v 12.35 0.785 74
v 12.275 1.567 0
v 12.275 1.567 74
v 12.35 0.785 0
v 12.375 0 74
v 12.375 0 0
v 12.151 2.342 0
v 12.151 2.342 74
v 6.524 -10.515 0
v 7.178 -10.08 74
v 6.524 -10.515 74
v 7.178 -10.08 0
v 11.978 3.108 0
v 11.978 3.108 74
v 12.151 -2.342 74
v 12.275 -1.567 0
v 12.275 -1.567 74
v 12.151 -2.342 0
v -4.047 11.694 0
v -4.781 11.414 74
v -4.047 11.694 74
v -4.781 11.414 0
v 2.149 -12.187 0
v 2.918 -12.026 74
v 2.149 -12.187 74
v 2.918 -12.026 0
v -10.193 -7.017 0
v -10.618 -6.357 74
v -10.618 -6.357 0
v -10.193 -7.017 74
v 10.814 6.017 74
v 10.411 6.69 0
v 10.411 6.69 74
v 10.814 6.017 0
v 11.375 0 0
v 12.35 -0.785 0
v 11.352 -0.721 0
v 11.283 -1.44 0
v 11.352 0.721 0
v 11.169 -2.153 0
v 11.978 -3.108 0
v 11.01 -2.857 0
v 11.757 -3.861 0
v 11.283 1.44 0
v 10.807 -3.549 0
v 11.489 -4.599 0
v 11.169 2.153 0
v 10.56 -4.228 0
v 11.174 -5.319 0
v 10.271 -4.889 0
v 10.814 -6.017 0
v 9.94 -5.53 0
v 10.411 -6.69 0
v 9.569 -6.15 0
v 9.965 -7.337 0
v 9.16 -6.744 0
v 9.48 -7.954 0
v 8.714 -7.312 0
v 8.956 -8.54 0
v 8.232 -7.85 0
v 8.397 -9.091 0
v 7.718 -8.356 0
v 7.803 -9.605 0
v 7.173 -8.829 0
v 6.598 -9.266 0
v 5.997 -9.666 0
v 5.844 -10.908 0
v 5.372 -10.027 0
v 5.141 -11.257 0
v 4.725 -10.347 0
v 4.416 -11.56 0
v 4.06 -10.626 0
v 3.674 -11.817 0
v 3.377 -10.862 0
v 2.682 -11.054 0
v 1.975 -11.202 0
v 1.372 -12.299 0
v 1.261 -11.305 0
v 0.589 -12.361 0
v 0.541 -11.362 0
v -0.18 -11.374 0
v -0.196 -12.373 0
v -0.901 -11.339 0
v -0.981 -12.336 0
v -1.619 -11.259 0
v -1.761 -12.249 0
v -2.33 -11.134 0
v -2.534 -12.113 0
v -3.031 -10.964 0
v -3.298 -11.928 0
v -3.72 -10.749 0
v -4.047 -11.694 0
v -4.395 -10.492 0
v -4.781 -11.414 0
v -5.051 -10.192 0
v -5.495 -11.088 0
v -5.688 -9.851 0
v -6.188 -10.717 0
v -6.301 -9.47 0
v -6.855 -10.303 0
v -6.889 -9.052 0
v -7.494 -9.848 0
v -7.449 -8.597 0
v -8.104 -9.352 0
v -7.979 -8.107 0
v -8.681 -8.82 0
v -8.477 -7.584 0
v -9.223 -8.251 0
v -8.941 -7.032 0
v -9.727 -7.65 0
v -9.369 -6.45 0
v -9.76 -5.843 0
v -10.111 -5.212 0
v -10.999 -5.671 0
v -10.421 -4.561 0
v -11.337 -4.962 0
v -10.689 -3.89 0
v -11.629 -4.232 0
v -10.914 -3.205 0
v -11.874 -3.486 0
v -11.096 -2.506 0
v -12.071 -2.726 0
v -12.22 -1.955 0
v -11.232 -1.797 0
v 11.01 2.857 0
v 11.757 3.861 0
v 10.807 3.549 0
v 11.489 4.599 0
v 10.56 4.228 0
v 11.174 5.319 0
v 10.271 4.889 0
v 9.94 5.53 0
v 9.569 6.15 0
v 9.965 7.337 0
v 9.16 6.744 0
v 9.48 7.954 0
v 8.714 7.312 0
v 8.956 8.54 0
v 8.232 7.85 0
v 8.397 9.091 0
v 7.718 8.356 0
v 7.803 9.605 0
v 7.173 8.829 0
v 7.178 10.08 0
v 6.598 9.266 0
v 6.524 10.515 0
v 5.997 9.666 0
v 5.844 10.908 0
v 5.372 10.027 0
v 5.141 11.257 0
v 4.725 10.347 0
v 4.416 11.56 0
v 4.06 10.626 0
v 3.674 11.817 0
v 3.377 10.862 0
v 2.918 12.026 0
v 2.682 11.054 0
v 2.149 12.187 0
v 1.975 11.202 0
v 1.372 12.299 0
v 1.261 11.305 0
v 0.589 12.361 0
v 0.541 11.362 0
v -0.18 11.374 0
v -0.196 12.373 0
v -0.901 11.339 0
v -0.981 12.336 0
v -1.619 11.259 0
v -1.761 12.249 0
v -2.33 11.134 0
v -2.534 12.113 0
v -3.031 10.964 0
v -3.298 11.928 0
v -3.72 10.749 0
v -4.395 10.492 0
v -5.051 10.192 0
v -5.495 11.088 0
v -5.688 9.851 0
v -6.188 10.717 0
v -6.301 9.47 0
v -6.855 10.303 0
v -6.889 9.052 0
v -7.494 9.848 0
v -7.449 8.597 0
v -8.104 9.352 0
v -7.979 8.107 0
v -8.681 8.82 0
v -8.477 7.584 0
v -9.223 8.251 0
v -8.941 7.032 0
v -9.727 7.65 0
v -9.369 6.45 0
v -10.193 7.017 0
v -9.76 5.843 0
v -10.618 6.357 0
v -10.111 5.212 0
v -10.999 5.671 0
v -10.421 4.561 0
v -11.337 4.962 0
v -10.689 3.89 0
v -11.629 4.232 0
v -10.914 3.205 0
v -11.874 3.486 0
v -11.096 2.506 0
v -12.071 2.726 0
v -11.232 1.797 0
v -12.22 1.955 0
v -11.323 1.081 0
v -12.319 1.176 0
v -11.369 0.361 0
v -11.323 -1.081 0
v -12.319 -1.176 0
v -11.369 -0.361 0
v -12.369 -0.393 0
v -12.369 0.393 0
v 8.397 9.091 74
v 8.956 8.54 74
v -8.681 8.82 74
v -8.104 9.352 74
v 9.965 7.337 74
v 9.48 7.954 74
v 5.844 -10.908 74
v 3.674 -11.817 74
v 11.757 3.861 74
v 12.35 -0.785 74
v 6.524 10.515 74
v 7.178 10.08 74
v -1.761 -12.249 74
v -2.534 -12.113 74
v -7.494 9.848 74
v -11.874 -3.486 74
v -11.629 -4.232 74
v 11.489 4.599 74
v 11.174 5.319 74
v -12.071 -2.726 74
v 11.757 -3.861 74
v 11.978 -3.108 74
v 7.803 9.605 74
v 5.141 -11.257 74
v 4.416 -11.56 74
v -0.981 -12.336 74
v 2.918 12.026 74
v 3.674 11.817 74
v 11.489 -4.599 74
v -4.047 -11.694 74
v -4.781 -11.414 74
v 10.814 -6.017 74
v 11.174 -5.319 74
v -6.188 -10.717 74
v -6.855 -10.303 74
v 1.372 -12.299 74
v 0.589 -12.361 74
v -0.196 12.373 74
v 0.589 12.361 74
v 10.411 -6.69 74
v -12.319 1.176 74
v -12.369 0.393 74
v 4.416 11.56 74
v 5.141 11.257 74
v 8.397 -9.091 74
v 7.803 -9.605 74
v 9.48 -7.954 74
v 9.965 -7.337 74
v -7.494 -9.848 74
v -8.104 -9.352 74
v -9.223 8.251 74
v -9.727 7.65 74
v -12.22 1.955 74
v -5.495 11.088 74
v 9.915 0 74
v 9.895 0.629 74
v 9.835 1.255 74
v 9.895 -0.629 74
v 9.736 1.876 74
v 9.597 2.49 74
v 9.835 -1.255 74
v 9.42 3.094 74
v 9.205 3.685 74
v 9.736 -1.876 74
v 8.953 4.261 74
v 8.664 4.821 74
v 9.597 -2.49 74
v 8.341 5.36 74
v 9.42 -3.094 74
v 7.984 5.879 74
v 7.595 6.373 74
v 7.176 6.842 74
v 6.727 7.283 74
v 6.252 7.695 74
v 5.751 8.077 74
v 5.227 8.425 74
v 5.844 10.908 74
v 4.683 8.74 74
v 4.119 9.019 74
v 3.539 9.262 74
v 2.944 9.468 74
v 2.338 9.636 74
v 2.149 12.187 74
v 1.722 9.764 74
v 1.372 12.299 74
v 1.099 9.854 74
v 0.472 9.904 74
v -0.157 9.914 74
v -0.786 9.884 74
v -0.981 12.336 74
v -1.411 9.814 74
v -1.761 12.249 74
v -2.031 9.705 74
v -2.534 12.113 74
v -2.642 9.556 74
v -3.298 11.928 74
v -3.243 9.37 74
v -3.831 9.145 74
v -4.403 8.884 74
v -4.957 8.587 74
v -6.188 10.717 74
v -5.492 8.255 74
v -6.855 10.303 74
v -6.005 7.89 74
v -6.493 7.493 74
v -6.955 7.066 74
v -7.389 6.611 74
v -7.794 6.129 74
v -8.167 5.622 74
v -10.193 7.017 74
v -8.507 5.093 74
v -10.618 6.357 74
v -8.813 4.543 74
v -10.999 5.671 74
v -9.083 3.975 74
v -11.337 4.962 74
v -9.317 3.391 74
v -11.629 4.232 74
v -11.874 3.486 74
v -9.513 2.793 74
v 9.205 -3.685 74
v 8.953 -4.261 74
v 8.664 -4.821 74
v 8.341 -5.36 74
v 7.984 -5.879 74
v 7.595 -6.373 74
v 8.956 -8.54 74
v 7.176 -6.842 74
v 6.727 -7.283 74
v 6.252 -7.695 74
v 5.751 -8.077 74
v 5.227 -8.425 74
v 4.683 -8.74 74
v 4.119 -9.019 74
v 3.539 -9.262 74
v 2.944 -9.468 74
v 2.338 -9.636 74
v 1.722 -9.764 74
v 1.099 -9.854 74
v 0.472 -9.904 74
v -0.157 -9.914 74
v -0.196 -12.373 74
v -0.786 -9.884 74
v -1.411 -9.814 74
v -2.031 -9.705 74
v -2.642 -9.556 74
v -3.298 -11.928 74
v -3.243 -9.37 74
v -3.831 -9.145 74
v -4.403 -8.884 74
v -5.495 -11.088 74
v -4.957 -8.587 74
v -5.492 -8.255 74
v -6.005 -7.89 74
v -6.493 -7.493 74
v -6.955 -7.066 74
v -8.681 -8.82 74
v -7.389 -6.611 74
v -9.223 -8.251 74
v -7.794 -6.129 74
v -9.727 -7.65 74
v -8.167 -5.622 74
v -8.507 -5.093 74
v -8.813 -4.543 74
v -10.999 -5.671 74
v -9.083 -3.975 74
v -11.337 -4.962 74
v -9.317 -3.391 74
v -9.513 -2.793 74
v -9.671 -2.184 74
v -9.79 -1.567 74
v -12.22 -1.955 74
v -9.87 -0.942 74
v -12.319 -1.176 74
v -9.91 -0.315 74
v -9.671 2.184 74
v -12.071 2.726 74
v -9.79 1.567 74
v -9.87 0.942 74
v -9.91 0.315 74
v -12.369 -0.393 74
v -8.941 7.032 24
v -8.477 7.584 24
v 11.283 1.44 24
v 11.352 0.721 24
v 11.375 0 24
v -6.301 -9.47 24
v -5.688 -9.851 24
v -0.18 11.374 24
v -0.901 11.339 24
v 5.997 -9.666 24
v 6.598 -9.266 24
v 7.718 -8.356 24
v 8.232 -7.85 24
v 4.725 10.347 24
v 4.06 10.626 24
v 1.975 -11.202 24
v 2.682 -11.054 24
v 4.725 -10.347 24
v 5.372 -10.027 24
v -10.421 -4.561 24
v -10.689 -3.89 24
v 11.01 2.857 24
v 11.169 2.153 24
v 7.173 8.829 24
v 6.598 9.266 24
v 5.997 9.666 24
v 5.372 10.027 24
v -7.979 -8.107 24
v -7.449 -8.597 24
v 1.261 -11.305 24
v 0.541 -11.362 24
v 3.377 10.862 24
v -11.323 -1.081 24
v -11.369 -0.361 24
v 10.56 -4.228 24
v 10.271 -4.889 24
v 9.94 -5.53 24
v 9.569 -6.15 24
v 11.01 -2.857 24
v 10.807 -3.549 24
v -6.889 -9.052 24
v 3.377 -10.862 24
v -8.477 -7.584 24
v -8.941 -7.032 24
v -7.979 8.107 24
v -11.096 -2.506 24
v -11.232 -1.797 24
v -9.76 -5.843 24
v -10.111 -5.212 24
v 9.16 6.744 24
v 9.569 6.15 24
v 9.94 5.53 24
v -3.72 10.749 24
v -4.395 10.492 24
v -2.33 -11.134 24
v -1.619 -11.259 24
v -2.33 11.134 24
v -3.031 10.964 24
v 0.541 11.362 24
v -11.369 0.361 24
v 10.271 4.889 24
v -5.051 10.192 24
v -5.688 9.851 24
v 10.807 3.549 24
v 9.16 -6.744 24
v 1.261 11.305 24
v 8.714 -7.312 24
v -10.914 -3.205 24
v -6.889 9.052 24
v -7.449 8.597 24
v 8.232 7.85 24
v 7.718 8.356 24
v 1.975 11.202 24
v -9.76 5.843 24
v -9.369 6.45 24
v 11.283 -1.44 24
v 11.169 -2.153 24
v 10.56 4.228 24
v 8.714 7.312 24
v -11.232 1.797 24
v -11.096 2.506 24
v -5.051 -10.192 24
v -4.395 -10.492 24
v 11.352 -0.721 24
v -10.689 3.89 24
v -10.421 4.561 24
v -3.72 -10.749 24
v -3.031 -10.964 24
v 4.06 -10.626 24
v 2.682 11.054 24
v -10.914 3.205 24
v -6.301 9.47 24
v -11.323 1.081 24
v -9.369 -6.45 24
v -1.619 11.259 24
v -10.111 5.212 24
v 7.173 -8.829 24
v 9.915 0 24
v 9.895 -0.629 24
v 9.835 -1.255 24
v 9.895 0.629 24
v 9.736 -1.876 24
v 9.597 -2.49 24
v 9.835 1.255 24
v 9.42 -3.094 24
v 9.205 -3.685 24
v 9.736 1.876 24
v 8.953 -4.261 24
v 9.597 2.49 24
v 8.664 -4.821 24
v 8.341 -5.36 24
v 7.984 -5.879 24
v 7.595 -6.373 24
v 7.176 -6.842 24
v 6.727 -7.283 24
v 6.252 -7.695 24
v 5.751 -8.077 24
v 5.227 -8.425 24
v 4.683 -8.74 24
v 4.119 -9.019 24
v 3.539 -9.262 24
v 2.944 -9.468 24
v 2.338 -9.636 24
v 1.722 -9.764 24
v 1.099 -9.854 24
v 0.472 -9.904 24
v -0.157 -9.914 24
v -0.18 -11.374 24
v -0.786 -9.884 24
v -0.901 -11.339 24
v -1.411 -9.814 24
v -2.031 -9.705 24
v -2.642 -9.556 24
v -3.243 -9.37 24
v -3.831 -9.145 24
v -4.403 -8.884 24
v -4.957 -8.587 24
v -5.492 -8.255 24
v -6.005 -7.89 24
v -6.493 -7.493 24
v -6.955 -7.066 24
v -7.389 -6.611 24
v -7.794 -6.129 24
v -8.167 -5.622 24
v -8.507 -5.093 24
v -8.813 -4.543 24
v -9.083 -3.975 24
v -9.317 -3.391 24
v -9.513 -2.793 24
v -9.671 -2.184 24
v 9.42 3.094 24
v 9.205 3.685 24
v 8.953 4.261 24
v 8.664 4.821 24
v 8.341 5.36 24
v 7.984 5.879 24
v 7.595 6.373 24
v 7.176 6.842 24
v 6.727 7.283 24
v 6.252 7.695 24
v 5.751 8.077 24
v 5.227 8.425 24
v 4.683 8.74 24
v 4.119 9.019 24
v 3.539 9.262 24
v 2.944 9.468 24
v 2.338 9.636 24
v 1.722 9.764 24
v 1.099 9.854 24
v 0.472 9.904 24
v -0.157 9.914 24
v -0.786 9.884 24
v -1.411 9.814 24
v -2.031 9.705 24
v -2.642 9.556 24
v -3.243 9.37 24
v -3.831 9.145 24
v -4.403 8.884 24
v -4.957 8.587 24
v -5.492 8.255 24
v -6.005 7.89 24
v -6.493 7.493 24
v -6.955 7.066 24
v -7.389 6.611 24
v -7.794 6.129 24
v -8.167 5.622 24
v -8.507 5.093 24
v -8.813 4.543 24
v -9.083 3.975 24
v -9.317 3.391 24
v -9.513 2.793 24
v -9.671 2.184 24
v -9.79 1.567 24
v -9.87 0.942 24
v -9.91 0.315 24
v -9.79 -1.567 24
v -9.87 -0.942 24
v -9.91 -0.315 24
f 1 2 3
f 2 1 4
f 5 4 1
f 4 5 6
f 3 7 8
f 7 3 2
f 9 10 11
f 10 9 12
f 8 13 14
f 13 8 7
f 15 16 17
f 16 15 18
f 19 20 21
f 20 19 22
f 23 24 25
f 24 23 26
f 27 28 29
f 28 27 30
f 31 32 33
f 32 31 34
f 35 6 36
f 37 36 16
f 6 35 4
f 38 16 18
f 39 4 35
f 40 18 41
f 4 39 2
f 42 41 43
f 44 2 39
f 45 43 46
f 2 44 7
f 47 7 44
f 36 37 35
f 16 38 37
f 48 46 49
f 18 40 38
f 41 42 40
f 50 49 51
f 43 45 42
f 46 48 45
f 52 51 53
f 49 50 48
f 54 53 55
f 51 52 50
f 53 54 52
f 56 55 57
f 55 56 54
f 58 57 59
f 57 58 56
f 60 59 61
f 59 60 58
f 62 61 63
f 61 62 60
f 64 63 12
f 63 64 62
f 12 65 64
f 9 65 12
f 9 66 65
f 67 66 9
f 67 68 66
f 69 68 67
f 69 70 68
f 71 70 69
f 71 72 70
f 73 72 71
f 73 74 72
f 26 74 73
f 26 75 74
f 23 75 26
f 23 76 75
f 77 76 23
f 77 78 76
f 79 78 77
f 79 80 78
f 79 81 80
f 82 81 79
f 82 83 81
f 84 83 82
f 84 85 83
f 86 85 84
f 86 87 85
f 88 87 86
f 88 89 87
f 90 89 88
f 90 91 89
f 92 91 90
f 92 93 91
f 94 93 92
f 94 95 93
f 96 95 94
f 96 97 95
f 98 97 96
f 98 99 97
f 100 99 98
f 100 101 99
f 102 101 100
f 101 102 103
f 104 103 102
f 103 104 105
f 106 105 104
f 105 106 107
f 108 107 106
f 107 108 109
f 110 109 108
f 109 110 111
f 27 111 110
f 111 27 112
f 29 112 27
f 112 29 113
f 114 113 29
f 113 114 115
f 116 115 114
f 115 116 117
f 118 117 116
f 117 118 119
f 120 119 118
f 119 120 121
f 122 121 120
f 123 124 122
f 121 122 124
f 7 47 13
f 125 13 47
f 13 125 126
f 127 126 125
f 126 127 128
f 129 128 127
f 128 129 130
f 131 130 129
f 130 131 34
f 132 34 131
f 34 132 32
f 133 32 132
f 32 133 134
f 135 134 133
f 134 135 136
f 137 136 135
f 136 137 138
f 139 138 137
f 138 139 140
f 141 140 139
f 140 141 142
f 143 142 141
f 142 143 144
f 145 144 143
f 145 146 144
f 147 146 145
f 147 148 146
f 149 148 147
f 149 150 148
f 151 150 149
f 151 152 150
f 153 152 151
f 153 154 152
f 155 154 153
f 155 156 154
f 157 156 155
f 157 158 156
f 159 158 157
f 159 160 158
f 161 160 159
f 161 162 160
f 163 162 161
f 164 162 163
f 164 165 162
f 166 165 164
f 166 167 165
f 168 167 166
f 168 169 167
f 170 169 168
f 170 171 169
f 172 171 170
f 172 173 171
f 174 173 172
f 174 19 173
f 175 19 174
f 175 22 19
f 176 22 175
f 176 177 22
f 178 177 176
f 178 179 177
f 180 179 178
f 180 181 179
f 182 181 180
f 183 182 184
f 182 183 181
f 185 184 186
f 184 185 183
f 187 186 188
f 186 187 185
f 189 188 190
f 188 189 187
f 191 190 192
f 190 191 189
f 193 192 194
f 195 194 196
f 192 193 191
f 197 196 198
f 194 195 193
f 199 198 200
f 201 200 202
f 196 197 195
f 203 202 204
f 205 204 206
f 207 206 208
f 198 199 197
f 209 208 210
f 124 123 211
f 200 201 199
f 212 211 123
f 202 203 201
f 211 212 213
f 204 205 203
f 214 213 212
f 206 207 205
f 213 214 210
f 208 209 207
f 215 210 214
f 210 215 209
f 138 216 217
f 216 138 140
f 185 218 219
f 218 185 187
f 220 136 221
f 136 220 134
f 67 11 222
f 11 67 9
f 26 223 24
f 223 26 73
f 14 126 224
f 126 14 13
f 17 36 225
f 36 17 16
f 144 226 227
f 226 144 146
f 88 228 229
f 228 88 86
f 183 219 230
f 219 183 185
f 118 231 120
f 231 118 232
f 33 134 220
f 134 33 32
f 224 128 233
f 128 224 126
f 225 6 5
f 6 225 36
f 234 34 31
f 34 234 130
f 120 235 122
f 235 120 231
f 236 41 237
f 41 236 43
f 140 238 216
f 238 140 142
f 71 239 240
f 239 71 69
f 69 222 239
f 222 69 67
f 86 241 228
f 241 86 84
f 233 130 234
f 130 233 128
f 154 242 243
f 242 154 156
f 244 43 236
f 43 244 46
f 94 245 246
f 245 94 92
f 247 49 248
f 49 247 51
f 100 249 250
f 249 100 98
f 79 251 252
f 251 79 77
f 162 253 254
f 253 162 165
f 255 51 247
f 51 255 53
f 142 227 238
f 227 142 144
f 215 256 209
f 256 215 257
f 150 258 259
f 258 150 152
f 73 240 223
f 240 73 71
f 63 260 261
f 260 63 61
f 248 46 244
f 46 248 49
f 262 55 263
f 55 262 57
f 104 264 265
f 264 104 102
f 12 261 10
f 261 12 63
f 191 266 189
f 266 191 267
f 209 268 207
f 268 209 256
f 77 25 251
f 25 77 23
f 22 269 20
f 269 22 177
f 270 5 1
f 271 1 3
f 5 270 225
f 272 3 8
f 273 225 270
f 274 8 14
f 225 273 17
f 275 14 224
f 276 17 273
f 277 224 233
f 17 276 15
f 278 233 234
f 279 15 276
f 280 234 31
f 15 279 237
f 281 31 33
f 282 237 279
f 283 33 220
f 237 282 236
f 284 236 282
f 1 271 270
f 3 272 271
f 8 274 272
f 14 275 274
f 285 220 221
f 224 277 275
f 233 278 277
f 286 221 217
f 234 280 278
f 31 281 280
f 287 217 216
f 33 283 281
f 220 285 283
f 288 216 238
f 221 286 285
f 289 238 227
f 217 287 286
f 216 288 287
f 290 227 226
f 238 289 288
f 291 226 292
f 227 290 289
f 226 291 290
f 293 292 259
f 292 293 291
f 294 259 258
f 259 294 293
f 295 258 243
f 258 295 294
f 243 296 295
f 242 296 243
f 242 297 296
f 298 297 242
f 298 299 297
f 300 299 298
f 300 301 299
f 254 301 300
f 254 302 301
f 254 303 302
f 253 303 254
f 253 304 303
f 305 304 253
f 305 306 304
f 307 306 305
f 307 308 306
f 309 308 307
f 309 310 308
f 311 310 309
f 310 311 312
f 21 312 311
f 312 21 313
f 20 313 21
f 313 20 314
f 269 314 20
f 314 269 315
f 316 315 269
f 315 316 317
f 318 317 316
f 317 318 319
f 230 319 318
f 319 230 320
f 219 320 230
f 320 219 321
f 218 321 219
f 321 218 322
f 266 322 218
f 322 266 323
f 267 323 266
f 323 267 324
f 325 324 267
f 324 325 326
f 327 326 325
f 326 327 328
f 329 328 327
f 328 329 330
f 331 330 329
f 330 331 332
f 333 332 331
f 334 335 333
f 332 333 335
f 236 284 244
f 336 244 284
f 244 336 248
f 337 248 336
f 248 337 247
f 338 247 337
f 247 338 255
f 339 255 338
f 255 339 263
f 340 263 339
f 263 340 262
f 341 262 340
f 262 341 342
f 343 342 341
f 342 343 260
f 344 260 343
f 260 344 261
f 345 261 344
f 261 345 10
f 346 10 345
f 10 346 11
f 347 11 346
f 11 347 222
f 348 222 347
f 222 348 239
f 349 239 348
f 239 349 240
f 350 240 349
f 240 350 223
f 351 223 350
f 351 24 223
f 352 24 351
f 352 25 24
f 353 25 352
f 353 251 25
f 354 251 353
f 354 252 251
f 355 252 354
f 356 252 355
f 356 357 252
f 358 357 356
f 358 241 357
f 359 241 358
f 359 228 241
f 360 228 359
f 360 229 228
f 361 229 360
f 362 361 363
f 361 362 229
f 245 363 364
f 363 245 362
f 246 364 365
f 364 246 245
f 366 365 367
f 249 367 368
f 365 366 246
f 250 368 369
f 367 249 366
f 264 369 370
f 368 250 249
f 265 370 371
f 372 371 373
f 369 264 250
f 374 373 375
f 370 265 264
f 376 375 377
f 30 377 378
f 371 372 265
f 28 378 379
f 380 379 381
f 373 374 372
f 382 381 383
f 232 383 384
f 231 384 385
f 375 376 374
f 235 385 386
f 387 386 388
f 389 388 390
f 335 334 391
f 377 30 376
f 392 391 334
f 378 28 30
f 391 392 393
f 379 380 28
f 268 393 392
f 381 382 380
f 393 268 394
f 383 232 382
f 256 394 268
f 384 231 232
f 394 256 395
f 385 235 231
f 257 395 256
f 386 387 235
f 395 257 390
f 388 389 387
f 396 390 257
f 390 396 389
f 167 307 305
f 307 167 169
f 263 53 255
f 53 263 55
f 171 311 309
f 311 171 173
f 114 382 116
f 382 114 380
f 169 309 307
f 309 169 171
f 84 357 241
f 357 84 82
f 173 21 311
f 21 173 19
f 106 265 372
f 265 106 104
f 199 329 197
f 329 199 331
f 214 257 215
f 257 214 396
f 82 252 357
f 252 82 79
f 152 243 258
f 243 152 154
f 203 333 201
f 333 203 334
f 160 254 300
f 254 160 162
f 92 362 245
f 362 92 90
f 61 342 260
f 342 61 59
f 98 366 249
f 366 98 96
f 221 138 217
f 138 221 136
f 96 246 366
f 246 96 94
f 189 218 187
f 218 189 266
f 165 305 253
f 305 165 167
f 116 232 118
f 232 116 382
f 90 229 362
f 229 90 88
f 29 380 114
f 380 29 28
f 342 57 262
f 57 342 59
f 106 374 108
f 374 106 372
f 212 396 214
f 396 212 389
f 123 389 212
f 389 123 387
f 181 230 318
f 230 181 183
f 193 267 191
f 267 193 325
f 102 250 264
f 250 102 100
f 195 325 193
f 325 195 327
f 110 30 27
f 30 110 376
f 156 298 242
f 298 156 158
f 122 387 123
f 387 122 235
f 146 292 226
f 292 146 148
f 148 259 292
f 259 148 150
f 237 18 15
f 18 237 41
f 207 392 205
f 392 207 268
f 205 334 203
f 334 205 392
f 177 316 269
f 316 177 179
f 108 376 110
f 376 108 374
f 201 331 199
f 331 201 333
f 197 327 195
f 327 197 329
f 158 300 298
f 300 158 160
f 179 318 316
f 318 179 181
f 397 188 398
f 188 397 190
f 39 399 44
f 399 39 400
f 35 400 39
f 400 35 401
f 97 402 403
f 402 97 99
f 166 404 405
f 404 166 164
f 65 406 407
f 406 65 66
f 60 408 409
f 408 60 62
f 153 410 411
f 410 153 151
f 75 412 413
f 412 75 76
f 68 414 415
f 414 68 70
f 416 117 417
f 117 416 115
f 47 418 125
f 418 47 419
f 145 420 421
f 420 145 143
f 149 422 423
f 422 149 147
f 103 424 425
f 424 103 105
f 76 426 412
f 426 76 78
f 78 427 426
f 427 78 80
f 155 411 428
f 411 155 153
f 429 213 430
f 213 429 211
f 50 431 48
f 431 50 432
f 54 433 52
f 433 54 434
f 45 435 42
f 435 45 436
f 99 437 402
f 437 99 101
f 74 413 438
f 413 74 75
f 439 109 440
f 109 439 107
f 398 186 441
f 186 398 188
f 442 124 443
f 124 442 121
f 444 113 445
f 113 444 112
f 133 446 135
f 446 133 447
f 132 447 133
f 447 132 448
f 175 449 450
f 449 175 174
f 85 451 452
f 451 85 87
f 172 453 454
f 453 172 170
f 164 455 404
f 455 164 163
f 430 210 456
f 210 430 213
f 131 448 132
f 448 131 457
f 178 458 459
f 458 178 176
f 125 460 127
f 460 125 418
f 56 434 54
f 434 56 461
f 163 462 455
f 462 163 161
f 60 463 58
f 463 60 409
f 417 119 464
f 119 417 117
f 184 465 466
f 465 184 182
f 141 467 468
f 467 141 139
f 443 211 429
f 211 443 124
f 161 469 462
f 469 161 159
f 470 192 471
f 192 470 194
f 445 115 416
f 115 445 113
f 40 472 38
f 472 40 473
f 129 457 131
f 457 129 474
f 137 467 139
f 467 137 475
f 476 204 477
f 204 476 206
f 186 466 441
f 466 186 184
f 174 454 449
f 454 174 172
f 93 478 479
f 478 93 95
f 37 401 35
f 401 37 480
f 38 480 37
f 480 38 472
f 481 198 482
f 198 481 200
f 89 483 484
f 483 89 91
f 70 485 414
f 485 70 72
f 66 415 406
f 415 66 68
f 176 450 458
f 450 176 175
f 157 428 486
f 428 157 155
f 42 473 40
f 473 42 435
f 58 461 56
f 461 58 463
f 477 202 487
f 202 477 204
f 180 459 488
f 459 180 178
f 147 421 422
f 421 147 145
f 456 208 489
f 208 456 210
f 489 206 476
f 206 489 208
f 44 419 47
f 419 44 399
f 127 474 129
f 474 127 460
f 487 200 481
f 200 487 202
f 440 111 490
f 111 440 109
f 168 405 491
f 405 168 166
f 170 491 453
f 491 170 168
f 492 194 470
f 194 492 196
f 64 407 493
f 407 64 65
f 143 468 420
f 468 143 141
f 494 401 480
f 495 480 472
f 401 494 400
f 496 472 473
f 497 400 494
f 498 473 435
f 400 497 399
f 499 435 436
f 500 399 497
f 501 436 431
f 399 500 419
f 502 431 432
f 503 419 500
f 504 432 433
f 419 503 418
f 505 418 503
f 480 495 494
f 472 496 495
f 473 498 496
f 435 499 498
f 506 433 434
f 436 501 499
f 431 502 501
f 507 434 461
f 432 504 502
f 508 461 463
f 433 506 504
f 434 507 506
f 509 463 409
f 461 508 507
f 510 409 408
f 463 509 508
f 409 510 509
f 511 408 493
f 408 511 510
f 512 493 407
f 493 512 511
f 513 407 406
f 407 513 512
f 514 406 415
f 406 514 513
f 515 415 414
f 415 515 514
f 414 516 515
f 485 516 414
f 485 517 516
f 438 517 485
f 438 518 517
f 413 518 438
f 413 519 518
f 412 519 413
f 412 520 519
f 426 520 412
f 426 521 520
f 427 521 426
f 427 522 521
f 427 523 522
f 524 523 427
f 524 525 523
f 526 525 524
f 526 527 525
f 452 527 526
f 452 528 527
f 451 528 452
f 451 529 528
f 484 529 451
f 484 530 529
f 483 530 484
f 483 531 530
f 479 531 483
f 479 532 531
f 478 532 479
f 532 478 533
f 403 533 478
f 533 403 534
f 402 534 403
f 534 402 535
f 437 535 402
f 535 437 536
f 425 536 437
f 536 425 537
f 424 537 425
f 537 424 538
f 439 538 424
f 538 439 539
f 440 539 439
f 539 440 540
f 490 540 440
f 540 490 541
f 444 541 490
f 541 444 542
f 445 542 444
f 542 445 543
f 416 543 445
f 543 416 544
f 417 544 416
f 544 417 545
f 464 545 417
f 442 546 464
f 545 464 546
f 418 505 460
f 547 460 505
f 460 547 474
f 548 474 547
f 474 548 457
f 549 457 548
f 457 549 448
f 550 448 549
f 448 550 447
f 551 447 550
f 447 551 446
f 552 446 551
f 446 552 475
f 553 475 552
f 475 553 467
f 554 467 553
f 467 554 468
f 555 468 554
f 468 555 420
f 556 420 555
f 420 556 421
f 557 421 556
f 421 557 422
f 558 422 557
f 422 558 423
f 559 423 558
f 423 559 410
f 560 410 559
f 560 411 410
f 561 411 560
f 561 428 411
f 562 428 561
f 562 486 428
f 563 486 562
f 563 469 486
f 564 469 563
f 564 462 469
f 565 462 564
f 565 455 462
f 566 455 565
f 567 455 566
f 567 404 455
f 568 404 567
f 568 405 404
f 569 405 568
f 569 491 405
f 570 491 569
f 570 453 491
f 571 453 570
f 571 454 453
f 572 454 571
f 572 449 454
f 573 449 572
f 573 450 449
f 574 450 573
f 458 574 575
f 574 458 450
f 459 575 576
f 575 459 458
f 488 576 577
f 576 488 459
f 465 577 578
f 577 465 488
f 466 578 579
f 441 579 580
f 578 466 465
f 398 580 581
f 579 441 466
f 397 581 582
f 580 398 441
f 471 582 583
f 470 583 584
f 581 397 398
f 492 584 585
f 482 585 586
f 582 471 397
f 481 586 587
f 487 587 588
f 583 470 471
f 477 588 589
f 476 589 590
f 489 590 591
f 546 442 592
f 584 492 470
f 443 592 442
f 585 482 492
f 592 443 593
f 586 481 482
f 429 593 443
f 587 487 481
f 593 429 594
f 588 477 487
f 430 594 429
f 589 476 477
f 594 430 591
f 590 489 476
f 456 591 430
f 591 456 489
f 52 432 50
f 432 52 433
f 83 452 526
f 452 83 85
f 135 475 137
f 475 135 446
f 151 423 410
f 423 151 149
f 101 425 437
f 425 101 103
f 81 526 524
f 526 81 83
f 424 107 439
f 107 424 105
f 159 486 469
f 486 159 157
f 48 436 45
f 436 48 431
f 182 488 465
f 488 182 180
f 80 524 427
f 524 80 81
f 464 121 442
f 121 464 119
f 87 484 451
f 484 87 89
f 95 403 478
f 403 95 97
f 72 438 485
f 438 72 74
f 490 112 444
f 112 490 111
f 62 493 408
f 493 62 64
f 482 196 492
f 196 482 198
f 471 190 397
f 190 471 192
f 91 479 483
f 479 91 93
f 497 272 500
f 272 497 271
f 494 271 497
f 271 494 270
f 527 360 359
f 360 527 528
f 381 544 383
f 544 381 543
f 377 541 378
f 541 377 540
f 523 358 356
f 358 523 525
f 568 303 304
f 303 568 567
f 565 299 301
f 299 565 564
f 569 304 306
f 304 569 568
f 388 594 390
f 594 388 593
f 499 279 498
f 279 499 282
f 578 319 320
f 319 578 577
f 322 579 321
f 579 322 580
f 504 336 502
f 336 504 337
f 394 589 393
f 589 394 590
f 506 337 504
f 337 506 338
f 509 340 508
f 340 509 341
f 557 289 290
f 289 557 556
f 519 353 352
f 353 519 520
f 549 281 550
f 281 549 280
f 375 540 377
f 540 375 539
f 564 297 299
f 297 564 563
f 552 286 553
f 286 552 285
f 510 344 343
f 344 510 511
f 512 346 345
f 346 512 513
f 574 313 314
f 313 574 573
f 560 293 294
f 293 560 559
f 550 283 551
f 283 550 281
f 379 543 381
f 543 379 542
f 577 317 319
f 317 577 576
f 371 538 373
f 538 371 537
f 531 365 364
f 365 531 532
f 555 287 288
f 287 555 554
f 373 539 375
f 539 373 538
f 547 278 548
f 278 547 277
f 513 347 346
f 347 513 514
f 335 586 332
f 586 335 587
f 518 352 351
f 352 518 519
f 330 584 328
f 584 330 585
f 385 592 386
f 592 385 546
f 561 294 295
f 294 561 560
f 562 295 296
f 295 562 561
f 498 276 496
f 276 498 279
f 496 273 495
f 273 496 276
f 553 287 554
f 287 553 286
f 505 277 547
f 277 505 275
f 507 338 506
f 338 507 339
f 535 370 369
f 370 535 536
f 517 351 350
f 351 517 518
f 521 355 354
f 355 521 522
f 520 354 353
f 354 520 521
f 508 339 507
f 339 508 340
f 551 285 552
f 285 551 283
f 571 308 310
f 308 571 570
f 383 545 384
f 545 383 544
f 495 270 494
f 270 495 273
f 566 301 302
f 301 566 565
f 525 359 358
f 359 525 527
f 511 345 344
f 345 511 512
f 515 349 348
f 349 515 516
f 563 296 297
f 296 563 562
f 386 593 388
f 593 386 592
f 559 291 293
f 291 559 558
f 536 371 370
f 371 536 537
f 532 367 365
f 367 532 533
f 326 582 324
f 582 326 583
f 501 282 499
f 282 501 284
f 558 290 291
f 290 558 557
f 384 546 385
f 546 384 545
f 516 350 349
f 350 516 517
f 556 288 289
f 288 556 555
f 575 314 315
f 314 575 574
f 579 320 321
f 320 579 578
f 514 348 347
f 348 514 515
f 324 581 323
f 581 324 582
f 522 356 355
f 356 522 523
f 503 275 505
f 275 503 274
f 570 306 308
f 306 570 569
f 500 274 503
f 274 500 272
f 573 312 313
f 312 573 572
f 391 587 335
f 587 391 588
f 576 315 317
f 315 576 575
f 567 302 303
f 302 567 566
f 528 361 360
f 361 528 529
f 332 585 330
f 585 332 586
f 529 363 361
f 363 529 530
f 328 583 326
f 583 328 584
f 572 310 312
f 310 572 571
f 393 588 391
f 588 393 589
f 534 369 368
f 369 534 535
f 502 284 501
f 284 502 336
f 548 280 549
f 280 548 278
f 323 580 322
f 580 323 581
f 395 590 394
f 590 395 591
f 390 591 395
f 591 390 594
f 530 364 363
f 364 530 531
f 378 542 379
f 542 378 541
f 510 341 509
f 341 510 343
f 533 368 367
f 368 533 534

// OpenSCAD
// Sensiron SF3000 inlet/outlet adapter
inletID = 19.83;
couplerID = 22.75;
couplerLength = 24;
couplerEx = 50; // coupler should extend at 5-10cm
inch = 25.4;

module coupler_tube(){
    $fn =99;
    difference(){
        cylinder(d = couplerID+2, h =couplerLength+couplerEx);
        translate([0,0,-1])cylinder(d=couplerID,h=couplerLength+1);
        translate([0,0,0])cylinder(d=inletID,h=couplerEx+couplerLength +1);
    }
}
module hose_barb(hose_id = .125*inch){
    $fn = 99;
    difference(){
        union(){
            cylinder(d=hose_id,h = .25*inch);
            translate([0,0,.25*inch])cylinder(r1 = (hose_id/2)+.5, r2 =(hose_id/2) - .5, h = .25 *inch);
            translate([0,0,.35*inch])cylinder(r1 = (hose_id/2)+.5, r2 =(hose_id/2) - .5, h = .15 *inch);
        }
        translate([0,0,-1])cylinder(d=hose_id -1, h = 1.25 *inch);
    }
} 
//hose_barb();
coupler_tube();
